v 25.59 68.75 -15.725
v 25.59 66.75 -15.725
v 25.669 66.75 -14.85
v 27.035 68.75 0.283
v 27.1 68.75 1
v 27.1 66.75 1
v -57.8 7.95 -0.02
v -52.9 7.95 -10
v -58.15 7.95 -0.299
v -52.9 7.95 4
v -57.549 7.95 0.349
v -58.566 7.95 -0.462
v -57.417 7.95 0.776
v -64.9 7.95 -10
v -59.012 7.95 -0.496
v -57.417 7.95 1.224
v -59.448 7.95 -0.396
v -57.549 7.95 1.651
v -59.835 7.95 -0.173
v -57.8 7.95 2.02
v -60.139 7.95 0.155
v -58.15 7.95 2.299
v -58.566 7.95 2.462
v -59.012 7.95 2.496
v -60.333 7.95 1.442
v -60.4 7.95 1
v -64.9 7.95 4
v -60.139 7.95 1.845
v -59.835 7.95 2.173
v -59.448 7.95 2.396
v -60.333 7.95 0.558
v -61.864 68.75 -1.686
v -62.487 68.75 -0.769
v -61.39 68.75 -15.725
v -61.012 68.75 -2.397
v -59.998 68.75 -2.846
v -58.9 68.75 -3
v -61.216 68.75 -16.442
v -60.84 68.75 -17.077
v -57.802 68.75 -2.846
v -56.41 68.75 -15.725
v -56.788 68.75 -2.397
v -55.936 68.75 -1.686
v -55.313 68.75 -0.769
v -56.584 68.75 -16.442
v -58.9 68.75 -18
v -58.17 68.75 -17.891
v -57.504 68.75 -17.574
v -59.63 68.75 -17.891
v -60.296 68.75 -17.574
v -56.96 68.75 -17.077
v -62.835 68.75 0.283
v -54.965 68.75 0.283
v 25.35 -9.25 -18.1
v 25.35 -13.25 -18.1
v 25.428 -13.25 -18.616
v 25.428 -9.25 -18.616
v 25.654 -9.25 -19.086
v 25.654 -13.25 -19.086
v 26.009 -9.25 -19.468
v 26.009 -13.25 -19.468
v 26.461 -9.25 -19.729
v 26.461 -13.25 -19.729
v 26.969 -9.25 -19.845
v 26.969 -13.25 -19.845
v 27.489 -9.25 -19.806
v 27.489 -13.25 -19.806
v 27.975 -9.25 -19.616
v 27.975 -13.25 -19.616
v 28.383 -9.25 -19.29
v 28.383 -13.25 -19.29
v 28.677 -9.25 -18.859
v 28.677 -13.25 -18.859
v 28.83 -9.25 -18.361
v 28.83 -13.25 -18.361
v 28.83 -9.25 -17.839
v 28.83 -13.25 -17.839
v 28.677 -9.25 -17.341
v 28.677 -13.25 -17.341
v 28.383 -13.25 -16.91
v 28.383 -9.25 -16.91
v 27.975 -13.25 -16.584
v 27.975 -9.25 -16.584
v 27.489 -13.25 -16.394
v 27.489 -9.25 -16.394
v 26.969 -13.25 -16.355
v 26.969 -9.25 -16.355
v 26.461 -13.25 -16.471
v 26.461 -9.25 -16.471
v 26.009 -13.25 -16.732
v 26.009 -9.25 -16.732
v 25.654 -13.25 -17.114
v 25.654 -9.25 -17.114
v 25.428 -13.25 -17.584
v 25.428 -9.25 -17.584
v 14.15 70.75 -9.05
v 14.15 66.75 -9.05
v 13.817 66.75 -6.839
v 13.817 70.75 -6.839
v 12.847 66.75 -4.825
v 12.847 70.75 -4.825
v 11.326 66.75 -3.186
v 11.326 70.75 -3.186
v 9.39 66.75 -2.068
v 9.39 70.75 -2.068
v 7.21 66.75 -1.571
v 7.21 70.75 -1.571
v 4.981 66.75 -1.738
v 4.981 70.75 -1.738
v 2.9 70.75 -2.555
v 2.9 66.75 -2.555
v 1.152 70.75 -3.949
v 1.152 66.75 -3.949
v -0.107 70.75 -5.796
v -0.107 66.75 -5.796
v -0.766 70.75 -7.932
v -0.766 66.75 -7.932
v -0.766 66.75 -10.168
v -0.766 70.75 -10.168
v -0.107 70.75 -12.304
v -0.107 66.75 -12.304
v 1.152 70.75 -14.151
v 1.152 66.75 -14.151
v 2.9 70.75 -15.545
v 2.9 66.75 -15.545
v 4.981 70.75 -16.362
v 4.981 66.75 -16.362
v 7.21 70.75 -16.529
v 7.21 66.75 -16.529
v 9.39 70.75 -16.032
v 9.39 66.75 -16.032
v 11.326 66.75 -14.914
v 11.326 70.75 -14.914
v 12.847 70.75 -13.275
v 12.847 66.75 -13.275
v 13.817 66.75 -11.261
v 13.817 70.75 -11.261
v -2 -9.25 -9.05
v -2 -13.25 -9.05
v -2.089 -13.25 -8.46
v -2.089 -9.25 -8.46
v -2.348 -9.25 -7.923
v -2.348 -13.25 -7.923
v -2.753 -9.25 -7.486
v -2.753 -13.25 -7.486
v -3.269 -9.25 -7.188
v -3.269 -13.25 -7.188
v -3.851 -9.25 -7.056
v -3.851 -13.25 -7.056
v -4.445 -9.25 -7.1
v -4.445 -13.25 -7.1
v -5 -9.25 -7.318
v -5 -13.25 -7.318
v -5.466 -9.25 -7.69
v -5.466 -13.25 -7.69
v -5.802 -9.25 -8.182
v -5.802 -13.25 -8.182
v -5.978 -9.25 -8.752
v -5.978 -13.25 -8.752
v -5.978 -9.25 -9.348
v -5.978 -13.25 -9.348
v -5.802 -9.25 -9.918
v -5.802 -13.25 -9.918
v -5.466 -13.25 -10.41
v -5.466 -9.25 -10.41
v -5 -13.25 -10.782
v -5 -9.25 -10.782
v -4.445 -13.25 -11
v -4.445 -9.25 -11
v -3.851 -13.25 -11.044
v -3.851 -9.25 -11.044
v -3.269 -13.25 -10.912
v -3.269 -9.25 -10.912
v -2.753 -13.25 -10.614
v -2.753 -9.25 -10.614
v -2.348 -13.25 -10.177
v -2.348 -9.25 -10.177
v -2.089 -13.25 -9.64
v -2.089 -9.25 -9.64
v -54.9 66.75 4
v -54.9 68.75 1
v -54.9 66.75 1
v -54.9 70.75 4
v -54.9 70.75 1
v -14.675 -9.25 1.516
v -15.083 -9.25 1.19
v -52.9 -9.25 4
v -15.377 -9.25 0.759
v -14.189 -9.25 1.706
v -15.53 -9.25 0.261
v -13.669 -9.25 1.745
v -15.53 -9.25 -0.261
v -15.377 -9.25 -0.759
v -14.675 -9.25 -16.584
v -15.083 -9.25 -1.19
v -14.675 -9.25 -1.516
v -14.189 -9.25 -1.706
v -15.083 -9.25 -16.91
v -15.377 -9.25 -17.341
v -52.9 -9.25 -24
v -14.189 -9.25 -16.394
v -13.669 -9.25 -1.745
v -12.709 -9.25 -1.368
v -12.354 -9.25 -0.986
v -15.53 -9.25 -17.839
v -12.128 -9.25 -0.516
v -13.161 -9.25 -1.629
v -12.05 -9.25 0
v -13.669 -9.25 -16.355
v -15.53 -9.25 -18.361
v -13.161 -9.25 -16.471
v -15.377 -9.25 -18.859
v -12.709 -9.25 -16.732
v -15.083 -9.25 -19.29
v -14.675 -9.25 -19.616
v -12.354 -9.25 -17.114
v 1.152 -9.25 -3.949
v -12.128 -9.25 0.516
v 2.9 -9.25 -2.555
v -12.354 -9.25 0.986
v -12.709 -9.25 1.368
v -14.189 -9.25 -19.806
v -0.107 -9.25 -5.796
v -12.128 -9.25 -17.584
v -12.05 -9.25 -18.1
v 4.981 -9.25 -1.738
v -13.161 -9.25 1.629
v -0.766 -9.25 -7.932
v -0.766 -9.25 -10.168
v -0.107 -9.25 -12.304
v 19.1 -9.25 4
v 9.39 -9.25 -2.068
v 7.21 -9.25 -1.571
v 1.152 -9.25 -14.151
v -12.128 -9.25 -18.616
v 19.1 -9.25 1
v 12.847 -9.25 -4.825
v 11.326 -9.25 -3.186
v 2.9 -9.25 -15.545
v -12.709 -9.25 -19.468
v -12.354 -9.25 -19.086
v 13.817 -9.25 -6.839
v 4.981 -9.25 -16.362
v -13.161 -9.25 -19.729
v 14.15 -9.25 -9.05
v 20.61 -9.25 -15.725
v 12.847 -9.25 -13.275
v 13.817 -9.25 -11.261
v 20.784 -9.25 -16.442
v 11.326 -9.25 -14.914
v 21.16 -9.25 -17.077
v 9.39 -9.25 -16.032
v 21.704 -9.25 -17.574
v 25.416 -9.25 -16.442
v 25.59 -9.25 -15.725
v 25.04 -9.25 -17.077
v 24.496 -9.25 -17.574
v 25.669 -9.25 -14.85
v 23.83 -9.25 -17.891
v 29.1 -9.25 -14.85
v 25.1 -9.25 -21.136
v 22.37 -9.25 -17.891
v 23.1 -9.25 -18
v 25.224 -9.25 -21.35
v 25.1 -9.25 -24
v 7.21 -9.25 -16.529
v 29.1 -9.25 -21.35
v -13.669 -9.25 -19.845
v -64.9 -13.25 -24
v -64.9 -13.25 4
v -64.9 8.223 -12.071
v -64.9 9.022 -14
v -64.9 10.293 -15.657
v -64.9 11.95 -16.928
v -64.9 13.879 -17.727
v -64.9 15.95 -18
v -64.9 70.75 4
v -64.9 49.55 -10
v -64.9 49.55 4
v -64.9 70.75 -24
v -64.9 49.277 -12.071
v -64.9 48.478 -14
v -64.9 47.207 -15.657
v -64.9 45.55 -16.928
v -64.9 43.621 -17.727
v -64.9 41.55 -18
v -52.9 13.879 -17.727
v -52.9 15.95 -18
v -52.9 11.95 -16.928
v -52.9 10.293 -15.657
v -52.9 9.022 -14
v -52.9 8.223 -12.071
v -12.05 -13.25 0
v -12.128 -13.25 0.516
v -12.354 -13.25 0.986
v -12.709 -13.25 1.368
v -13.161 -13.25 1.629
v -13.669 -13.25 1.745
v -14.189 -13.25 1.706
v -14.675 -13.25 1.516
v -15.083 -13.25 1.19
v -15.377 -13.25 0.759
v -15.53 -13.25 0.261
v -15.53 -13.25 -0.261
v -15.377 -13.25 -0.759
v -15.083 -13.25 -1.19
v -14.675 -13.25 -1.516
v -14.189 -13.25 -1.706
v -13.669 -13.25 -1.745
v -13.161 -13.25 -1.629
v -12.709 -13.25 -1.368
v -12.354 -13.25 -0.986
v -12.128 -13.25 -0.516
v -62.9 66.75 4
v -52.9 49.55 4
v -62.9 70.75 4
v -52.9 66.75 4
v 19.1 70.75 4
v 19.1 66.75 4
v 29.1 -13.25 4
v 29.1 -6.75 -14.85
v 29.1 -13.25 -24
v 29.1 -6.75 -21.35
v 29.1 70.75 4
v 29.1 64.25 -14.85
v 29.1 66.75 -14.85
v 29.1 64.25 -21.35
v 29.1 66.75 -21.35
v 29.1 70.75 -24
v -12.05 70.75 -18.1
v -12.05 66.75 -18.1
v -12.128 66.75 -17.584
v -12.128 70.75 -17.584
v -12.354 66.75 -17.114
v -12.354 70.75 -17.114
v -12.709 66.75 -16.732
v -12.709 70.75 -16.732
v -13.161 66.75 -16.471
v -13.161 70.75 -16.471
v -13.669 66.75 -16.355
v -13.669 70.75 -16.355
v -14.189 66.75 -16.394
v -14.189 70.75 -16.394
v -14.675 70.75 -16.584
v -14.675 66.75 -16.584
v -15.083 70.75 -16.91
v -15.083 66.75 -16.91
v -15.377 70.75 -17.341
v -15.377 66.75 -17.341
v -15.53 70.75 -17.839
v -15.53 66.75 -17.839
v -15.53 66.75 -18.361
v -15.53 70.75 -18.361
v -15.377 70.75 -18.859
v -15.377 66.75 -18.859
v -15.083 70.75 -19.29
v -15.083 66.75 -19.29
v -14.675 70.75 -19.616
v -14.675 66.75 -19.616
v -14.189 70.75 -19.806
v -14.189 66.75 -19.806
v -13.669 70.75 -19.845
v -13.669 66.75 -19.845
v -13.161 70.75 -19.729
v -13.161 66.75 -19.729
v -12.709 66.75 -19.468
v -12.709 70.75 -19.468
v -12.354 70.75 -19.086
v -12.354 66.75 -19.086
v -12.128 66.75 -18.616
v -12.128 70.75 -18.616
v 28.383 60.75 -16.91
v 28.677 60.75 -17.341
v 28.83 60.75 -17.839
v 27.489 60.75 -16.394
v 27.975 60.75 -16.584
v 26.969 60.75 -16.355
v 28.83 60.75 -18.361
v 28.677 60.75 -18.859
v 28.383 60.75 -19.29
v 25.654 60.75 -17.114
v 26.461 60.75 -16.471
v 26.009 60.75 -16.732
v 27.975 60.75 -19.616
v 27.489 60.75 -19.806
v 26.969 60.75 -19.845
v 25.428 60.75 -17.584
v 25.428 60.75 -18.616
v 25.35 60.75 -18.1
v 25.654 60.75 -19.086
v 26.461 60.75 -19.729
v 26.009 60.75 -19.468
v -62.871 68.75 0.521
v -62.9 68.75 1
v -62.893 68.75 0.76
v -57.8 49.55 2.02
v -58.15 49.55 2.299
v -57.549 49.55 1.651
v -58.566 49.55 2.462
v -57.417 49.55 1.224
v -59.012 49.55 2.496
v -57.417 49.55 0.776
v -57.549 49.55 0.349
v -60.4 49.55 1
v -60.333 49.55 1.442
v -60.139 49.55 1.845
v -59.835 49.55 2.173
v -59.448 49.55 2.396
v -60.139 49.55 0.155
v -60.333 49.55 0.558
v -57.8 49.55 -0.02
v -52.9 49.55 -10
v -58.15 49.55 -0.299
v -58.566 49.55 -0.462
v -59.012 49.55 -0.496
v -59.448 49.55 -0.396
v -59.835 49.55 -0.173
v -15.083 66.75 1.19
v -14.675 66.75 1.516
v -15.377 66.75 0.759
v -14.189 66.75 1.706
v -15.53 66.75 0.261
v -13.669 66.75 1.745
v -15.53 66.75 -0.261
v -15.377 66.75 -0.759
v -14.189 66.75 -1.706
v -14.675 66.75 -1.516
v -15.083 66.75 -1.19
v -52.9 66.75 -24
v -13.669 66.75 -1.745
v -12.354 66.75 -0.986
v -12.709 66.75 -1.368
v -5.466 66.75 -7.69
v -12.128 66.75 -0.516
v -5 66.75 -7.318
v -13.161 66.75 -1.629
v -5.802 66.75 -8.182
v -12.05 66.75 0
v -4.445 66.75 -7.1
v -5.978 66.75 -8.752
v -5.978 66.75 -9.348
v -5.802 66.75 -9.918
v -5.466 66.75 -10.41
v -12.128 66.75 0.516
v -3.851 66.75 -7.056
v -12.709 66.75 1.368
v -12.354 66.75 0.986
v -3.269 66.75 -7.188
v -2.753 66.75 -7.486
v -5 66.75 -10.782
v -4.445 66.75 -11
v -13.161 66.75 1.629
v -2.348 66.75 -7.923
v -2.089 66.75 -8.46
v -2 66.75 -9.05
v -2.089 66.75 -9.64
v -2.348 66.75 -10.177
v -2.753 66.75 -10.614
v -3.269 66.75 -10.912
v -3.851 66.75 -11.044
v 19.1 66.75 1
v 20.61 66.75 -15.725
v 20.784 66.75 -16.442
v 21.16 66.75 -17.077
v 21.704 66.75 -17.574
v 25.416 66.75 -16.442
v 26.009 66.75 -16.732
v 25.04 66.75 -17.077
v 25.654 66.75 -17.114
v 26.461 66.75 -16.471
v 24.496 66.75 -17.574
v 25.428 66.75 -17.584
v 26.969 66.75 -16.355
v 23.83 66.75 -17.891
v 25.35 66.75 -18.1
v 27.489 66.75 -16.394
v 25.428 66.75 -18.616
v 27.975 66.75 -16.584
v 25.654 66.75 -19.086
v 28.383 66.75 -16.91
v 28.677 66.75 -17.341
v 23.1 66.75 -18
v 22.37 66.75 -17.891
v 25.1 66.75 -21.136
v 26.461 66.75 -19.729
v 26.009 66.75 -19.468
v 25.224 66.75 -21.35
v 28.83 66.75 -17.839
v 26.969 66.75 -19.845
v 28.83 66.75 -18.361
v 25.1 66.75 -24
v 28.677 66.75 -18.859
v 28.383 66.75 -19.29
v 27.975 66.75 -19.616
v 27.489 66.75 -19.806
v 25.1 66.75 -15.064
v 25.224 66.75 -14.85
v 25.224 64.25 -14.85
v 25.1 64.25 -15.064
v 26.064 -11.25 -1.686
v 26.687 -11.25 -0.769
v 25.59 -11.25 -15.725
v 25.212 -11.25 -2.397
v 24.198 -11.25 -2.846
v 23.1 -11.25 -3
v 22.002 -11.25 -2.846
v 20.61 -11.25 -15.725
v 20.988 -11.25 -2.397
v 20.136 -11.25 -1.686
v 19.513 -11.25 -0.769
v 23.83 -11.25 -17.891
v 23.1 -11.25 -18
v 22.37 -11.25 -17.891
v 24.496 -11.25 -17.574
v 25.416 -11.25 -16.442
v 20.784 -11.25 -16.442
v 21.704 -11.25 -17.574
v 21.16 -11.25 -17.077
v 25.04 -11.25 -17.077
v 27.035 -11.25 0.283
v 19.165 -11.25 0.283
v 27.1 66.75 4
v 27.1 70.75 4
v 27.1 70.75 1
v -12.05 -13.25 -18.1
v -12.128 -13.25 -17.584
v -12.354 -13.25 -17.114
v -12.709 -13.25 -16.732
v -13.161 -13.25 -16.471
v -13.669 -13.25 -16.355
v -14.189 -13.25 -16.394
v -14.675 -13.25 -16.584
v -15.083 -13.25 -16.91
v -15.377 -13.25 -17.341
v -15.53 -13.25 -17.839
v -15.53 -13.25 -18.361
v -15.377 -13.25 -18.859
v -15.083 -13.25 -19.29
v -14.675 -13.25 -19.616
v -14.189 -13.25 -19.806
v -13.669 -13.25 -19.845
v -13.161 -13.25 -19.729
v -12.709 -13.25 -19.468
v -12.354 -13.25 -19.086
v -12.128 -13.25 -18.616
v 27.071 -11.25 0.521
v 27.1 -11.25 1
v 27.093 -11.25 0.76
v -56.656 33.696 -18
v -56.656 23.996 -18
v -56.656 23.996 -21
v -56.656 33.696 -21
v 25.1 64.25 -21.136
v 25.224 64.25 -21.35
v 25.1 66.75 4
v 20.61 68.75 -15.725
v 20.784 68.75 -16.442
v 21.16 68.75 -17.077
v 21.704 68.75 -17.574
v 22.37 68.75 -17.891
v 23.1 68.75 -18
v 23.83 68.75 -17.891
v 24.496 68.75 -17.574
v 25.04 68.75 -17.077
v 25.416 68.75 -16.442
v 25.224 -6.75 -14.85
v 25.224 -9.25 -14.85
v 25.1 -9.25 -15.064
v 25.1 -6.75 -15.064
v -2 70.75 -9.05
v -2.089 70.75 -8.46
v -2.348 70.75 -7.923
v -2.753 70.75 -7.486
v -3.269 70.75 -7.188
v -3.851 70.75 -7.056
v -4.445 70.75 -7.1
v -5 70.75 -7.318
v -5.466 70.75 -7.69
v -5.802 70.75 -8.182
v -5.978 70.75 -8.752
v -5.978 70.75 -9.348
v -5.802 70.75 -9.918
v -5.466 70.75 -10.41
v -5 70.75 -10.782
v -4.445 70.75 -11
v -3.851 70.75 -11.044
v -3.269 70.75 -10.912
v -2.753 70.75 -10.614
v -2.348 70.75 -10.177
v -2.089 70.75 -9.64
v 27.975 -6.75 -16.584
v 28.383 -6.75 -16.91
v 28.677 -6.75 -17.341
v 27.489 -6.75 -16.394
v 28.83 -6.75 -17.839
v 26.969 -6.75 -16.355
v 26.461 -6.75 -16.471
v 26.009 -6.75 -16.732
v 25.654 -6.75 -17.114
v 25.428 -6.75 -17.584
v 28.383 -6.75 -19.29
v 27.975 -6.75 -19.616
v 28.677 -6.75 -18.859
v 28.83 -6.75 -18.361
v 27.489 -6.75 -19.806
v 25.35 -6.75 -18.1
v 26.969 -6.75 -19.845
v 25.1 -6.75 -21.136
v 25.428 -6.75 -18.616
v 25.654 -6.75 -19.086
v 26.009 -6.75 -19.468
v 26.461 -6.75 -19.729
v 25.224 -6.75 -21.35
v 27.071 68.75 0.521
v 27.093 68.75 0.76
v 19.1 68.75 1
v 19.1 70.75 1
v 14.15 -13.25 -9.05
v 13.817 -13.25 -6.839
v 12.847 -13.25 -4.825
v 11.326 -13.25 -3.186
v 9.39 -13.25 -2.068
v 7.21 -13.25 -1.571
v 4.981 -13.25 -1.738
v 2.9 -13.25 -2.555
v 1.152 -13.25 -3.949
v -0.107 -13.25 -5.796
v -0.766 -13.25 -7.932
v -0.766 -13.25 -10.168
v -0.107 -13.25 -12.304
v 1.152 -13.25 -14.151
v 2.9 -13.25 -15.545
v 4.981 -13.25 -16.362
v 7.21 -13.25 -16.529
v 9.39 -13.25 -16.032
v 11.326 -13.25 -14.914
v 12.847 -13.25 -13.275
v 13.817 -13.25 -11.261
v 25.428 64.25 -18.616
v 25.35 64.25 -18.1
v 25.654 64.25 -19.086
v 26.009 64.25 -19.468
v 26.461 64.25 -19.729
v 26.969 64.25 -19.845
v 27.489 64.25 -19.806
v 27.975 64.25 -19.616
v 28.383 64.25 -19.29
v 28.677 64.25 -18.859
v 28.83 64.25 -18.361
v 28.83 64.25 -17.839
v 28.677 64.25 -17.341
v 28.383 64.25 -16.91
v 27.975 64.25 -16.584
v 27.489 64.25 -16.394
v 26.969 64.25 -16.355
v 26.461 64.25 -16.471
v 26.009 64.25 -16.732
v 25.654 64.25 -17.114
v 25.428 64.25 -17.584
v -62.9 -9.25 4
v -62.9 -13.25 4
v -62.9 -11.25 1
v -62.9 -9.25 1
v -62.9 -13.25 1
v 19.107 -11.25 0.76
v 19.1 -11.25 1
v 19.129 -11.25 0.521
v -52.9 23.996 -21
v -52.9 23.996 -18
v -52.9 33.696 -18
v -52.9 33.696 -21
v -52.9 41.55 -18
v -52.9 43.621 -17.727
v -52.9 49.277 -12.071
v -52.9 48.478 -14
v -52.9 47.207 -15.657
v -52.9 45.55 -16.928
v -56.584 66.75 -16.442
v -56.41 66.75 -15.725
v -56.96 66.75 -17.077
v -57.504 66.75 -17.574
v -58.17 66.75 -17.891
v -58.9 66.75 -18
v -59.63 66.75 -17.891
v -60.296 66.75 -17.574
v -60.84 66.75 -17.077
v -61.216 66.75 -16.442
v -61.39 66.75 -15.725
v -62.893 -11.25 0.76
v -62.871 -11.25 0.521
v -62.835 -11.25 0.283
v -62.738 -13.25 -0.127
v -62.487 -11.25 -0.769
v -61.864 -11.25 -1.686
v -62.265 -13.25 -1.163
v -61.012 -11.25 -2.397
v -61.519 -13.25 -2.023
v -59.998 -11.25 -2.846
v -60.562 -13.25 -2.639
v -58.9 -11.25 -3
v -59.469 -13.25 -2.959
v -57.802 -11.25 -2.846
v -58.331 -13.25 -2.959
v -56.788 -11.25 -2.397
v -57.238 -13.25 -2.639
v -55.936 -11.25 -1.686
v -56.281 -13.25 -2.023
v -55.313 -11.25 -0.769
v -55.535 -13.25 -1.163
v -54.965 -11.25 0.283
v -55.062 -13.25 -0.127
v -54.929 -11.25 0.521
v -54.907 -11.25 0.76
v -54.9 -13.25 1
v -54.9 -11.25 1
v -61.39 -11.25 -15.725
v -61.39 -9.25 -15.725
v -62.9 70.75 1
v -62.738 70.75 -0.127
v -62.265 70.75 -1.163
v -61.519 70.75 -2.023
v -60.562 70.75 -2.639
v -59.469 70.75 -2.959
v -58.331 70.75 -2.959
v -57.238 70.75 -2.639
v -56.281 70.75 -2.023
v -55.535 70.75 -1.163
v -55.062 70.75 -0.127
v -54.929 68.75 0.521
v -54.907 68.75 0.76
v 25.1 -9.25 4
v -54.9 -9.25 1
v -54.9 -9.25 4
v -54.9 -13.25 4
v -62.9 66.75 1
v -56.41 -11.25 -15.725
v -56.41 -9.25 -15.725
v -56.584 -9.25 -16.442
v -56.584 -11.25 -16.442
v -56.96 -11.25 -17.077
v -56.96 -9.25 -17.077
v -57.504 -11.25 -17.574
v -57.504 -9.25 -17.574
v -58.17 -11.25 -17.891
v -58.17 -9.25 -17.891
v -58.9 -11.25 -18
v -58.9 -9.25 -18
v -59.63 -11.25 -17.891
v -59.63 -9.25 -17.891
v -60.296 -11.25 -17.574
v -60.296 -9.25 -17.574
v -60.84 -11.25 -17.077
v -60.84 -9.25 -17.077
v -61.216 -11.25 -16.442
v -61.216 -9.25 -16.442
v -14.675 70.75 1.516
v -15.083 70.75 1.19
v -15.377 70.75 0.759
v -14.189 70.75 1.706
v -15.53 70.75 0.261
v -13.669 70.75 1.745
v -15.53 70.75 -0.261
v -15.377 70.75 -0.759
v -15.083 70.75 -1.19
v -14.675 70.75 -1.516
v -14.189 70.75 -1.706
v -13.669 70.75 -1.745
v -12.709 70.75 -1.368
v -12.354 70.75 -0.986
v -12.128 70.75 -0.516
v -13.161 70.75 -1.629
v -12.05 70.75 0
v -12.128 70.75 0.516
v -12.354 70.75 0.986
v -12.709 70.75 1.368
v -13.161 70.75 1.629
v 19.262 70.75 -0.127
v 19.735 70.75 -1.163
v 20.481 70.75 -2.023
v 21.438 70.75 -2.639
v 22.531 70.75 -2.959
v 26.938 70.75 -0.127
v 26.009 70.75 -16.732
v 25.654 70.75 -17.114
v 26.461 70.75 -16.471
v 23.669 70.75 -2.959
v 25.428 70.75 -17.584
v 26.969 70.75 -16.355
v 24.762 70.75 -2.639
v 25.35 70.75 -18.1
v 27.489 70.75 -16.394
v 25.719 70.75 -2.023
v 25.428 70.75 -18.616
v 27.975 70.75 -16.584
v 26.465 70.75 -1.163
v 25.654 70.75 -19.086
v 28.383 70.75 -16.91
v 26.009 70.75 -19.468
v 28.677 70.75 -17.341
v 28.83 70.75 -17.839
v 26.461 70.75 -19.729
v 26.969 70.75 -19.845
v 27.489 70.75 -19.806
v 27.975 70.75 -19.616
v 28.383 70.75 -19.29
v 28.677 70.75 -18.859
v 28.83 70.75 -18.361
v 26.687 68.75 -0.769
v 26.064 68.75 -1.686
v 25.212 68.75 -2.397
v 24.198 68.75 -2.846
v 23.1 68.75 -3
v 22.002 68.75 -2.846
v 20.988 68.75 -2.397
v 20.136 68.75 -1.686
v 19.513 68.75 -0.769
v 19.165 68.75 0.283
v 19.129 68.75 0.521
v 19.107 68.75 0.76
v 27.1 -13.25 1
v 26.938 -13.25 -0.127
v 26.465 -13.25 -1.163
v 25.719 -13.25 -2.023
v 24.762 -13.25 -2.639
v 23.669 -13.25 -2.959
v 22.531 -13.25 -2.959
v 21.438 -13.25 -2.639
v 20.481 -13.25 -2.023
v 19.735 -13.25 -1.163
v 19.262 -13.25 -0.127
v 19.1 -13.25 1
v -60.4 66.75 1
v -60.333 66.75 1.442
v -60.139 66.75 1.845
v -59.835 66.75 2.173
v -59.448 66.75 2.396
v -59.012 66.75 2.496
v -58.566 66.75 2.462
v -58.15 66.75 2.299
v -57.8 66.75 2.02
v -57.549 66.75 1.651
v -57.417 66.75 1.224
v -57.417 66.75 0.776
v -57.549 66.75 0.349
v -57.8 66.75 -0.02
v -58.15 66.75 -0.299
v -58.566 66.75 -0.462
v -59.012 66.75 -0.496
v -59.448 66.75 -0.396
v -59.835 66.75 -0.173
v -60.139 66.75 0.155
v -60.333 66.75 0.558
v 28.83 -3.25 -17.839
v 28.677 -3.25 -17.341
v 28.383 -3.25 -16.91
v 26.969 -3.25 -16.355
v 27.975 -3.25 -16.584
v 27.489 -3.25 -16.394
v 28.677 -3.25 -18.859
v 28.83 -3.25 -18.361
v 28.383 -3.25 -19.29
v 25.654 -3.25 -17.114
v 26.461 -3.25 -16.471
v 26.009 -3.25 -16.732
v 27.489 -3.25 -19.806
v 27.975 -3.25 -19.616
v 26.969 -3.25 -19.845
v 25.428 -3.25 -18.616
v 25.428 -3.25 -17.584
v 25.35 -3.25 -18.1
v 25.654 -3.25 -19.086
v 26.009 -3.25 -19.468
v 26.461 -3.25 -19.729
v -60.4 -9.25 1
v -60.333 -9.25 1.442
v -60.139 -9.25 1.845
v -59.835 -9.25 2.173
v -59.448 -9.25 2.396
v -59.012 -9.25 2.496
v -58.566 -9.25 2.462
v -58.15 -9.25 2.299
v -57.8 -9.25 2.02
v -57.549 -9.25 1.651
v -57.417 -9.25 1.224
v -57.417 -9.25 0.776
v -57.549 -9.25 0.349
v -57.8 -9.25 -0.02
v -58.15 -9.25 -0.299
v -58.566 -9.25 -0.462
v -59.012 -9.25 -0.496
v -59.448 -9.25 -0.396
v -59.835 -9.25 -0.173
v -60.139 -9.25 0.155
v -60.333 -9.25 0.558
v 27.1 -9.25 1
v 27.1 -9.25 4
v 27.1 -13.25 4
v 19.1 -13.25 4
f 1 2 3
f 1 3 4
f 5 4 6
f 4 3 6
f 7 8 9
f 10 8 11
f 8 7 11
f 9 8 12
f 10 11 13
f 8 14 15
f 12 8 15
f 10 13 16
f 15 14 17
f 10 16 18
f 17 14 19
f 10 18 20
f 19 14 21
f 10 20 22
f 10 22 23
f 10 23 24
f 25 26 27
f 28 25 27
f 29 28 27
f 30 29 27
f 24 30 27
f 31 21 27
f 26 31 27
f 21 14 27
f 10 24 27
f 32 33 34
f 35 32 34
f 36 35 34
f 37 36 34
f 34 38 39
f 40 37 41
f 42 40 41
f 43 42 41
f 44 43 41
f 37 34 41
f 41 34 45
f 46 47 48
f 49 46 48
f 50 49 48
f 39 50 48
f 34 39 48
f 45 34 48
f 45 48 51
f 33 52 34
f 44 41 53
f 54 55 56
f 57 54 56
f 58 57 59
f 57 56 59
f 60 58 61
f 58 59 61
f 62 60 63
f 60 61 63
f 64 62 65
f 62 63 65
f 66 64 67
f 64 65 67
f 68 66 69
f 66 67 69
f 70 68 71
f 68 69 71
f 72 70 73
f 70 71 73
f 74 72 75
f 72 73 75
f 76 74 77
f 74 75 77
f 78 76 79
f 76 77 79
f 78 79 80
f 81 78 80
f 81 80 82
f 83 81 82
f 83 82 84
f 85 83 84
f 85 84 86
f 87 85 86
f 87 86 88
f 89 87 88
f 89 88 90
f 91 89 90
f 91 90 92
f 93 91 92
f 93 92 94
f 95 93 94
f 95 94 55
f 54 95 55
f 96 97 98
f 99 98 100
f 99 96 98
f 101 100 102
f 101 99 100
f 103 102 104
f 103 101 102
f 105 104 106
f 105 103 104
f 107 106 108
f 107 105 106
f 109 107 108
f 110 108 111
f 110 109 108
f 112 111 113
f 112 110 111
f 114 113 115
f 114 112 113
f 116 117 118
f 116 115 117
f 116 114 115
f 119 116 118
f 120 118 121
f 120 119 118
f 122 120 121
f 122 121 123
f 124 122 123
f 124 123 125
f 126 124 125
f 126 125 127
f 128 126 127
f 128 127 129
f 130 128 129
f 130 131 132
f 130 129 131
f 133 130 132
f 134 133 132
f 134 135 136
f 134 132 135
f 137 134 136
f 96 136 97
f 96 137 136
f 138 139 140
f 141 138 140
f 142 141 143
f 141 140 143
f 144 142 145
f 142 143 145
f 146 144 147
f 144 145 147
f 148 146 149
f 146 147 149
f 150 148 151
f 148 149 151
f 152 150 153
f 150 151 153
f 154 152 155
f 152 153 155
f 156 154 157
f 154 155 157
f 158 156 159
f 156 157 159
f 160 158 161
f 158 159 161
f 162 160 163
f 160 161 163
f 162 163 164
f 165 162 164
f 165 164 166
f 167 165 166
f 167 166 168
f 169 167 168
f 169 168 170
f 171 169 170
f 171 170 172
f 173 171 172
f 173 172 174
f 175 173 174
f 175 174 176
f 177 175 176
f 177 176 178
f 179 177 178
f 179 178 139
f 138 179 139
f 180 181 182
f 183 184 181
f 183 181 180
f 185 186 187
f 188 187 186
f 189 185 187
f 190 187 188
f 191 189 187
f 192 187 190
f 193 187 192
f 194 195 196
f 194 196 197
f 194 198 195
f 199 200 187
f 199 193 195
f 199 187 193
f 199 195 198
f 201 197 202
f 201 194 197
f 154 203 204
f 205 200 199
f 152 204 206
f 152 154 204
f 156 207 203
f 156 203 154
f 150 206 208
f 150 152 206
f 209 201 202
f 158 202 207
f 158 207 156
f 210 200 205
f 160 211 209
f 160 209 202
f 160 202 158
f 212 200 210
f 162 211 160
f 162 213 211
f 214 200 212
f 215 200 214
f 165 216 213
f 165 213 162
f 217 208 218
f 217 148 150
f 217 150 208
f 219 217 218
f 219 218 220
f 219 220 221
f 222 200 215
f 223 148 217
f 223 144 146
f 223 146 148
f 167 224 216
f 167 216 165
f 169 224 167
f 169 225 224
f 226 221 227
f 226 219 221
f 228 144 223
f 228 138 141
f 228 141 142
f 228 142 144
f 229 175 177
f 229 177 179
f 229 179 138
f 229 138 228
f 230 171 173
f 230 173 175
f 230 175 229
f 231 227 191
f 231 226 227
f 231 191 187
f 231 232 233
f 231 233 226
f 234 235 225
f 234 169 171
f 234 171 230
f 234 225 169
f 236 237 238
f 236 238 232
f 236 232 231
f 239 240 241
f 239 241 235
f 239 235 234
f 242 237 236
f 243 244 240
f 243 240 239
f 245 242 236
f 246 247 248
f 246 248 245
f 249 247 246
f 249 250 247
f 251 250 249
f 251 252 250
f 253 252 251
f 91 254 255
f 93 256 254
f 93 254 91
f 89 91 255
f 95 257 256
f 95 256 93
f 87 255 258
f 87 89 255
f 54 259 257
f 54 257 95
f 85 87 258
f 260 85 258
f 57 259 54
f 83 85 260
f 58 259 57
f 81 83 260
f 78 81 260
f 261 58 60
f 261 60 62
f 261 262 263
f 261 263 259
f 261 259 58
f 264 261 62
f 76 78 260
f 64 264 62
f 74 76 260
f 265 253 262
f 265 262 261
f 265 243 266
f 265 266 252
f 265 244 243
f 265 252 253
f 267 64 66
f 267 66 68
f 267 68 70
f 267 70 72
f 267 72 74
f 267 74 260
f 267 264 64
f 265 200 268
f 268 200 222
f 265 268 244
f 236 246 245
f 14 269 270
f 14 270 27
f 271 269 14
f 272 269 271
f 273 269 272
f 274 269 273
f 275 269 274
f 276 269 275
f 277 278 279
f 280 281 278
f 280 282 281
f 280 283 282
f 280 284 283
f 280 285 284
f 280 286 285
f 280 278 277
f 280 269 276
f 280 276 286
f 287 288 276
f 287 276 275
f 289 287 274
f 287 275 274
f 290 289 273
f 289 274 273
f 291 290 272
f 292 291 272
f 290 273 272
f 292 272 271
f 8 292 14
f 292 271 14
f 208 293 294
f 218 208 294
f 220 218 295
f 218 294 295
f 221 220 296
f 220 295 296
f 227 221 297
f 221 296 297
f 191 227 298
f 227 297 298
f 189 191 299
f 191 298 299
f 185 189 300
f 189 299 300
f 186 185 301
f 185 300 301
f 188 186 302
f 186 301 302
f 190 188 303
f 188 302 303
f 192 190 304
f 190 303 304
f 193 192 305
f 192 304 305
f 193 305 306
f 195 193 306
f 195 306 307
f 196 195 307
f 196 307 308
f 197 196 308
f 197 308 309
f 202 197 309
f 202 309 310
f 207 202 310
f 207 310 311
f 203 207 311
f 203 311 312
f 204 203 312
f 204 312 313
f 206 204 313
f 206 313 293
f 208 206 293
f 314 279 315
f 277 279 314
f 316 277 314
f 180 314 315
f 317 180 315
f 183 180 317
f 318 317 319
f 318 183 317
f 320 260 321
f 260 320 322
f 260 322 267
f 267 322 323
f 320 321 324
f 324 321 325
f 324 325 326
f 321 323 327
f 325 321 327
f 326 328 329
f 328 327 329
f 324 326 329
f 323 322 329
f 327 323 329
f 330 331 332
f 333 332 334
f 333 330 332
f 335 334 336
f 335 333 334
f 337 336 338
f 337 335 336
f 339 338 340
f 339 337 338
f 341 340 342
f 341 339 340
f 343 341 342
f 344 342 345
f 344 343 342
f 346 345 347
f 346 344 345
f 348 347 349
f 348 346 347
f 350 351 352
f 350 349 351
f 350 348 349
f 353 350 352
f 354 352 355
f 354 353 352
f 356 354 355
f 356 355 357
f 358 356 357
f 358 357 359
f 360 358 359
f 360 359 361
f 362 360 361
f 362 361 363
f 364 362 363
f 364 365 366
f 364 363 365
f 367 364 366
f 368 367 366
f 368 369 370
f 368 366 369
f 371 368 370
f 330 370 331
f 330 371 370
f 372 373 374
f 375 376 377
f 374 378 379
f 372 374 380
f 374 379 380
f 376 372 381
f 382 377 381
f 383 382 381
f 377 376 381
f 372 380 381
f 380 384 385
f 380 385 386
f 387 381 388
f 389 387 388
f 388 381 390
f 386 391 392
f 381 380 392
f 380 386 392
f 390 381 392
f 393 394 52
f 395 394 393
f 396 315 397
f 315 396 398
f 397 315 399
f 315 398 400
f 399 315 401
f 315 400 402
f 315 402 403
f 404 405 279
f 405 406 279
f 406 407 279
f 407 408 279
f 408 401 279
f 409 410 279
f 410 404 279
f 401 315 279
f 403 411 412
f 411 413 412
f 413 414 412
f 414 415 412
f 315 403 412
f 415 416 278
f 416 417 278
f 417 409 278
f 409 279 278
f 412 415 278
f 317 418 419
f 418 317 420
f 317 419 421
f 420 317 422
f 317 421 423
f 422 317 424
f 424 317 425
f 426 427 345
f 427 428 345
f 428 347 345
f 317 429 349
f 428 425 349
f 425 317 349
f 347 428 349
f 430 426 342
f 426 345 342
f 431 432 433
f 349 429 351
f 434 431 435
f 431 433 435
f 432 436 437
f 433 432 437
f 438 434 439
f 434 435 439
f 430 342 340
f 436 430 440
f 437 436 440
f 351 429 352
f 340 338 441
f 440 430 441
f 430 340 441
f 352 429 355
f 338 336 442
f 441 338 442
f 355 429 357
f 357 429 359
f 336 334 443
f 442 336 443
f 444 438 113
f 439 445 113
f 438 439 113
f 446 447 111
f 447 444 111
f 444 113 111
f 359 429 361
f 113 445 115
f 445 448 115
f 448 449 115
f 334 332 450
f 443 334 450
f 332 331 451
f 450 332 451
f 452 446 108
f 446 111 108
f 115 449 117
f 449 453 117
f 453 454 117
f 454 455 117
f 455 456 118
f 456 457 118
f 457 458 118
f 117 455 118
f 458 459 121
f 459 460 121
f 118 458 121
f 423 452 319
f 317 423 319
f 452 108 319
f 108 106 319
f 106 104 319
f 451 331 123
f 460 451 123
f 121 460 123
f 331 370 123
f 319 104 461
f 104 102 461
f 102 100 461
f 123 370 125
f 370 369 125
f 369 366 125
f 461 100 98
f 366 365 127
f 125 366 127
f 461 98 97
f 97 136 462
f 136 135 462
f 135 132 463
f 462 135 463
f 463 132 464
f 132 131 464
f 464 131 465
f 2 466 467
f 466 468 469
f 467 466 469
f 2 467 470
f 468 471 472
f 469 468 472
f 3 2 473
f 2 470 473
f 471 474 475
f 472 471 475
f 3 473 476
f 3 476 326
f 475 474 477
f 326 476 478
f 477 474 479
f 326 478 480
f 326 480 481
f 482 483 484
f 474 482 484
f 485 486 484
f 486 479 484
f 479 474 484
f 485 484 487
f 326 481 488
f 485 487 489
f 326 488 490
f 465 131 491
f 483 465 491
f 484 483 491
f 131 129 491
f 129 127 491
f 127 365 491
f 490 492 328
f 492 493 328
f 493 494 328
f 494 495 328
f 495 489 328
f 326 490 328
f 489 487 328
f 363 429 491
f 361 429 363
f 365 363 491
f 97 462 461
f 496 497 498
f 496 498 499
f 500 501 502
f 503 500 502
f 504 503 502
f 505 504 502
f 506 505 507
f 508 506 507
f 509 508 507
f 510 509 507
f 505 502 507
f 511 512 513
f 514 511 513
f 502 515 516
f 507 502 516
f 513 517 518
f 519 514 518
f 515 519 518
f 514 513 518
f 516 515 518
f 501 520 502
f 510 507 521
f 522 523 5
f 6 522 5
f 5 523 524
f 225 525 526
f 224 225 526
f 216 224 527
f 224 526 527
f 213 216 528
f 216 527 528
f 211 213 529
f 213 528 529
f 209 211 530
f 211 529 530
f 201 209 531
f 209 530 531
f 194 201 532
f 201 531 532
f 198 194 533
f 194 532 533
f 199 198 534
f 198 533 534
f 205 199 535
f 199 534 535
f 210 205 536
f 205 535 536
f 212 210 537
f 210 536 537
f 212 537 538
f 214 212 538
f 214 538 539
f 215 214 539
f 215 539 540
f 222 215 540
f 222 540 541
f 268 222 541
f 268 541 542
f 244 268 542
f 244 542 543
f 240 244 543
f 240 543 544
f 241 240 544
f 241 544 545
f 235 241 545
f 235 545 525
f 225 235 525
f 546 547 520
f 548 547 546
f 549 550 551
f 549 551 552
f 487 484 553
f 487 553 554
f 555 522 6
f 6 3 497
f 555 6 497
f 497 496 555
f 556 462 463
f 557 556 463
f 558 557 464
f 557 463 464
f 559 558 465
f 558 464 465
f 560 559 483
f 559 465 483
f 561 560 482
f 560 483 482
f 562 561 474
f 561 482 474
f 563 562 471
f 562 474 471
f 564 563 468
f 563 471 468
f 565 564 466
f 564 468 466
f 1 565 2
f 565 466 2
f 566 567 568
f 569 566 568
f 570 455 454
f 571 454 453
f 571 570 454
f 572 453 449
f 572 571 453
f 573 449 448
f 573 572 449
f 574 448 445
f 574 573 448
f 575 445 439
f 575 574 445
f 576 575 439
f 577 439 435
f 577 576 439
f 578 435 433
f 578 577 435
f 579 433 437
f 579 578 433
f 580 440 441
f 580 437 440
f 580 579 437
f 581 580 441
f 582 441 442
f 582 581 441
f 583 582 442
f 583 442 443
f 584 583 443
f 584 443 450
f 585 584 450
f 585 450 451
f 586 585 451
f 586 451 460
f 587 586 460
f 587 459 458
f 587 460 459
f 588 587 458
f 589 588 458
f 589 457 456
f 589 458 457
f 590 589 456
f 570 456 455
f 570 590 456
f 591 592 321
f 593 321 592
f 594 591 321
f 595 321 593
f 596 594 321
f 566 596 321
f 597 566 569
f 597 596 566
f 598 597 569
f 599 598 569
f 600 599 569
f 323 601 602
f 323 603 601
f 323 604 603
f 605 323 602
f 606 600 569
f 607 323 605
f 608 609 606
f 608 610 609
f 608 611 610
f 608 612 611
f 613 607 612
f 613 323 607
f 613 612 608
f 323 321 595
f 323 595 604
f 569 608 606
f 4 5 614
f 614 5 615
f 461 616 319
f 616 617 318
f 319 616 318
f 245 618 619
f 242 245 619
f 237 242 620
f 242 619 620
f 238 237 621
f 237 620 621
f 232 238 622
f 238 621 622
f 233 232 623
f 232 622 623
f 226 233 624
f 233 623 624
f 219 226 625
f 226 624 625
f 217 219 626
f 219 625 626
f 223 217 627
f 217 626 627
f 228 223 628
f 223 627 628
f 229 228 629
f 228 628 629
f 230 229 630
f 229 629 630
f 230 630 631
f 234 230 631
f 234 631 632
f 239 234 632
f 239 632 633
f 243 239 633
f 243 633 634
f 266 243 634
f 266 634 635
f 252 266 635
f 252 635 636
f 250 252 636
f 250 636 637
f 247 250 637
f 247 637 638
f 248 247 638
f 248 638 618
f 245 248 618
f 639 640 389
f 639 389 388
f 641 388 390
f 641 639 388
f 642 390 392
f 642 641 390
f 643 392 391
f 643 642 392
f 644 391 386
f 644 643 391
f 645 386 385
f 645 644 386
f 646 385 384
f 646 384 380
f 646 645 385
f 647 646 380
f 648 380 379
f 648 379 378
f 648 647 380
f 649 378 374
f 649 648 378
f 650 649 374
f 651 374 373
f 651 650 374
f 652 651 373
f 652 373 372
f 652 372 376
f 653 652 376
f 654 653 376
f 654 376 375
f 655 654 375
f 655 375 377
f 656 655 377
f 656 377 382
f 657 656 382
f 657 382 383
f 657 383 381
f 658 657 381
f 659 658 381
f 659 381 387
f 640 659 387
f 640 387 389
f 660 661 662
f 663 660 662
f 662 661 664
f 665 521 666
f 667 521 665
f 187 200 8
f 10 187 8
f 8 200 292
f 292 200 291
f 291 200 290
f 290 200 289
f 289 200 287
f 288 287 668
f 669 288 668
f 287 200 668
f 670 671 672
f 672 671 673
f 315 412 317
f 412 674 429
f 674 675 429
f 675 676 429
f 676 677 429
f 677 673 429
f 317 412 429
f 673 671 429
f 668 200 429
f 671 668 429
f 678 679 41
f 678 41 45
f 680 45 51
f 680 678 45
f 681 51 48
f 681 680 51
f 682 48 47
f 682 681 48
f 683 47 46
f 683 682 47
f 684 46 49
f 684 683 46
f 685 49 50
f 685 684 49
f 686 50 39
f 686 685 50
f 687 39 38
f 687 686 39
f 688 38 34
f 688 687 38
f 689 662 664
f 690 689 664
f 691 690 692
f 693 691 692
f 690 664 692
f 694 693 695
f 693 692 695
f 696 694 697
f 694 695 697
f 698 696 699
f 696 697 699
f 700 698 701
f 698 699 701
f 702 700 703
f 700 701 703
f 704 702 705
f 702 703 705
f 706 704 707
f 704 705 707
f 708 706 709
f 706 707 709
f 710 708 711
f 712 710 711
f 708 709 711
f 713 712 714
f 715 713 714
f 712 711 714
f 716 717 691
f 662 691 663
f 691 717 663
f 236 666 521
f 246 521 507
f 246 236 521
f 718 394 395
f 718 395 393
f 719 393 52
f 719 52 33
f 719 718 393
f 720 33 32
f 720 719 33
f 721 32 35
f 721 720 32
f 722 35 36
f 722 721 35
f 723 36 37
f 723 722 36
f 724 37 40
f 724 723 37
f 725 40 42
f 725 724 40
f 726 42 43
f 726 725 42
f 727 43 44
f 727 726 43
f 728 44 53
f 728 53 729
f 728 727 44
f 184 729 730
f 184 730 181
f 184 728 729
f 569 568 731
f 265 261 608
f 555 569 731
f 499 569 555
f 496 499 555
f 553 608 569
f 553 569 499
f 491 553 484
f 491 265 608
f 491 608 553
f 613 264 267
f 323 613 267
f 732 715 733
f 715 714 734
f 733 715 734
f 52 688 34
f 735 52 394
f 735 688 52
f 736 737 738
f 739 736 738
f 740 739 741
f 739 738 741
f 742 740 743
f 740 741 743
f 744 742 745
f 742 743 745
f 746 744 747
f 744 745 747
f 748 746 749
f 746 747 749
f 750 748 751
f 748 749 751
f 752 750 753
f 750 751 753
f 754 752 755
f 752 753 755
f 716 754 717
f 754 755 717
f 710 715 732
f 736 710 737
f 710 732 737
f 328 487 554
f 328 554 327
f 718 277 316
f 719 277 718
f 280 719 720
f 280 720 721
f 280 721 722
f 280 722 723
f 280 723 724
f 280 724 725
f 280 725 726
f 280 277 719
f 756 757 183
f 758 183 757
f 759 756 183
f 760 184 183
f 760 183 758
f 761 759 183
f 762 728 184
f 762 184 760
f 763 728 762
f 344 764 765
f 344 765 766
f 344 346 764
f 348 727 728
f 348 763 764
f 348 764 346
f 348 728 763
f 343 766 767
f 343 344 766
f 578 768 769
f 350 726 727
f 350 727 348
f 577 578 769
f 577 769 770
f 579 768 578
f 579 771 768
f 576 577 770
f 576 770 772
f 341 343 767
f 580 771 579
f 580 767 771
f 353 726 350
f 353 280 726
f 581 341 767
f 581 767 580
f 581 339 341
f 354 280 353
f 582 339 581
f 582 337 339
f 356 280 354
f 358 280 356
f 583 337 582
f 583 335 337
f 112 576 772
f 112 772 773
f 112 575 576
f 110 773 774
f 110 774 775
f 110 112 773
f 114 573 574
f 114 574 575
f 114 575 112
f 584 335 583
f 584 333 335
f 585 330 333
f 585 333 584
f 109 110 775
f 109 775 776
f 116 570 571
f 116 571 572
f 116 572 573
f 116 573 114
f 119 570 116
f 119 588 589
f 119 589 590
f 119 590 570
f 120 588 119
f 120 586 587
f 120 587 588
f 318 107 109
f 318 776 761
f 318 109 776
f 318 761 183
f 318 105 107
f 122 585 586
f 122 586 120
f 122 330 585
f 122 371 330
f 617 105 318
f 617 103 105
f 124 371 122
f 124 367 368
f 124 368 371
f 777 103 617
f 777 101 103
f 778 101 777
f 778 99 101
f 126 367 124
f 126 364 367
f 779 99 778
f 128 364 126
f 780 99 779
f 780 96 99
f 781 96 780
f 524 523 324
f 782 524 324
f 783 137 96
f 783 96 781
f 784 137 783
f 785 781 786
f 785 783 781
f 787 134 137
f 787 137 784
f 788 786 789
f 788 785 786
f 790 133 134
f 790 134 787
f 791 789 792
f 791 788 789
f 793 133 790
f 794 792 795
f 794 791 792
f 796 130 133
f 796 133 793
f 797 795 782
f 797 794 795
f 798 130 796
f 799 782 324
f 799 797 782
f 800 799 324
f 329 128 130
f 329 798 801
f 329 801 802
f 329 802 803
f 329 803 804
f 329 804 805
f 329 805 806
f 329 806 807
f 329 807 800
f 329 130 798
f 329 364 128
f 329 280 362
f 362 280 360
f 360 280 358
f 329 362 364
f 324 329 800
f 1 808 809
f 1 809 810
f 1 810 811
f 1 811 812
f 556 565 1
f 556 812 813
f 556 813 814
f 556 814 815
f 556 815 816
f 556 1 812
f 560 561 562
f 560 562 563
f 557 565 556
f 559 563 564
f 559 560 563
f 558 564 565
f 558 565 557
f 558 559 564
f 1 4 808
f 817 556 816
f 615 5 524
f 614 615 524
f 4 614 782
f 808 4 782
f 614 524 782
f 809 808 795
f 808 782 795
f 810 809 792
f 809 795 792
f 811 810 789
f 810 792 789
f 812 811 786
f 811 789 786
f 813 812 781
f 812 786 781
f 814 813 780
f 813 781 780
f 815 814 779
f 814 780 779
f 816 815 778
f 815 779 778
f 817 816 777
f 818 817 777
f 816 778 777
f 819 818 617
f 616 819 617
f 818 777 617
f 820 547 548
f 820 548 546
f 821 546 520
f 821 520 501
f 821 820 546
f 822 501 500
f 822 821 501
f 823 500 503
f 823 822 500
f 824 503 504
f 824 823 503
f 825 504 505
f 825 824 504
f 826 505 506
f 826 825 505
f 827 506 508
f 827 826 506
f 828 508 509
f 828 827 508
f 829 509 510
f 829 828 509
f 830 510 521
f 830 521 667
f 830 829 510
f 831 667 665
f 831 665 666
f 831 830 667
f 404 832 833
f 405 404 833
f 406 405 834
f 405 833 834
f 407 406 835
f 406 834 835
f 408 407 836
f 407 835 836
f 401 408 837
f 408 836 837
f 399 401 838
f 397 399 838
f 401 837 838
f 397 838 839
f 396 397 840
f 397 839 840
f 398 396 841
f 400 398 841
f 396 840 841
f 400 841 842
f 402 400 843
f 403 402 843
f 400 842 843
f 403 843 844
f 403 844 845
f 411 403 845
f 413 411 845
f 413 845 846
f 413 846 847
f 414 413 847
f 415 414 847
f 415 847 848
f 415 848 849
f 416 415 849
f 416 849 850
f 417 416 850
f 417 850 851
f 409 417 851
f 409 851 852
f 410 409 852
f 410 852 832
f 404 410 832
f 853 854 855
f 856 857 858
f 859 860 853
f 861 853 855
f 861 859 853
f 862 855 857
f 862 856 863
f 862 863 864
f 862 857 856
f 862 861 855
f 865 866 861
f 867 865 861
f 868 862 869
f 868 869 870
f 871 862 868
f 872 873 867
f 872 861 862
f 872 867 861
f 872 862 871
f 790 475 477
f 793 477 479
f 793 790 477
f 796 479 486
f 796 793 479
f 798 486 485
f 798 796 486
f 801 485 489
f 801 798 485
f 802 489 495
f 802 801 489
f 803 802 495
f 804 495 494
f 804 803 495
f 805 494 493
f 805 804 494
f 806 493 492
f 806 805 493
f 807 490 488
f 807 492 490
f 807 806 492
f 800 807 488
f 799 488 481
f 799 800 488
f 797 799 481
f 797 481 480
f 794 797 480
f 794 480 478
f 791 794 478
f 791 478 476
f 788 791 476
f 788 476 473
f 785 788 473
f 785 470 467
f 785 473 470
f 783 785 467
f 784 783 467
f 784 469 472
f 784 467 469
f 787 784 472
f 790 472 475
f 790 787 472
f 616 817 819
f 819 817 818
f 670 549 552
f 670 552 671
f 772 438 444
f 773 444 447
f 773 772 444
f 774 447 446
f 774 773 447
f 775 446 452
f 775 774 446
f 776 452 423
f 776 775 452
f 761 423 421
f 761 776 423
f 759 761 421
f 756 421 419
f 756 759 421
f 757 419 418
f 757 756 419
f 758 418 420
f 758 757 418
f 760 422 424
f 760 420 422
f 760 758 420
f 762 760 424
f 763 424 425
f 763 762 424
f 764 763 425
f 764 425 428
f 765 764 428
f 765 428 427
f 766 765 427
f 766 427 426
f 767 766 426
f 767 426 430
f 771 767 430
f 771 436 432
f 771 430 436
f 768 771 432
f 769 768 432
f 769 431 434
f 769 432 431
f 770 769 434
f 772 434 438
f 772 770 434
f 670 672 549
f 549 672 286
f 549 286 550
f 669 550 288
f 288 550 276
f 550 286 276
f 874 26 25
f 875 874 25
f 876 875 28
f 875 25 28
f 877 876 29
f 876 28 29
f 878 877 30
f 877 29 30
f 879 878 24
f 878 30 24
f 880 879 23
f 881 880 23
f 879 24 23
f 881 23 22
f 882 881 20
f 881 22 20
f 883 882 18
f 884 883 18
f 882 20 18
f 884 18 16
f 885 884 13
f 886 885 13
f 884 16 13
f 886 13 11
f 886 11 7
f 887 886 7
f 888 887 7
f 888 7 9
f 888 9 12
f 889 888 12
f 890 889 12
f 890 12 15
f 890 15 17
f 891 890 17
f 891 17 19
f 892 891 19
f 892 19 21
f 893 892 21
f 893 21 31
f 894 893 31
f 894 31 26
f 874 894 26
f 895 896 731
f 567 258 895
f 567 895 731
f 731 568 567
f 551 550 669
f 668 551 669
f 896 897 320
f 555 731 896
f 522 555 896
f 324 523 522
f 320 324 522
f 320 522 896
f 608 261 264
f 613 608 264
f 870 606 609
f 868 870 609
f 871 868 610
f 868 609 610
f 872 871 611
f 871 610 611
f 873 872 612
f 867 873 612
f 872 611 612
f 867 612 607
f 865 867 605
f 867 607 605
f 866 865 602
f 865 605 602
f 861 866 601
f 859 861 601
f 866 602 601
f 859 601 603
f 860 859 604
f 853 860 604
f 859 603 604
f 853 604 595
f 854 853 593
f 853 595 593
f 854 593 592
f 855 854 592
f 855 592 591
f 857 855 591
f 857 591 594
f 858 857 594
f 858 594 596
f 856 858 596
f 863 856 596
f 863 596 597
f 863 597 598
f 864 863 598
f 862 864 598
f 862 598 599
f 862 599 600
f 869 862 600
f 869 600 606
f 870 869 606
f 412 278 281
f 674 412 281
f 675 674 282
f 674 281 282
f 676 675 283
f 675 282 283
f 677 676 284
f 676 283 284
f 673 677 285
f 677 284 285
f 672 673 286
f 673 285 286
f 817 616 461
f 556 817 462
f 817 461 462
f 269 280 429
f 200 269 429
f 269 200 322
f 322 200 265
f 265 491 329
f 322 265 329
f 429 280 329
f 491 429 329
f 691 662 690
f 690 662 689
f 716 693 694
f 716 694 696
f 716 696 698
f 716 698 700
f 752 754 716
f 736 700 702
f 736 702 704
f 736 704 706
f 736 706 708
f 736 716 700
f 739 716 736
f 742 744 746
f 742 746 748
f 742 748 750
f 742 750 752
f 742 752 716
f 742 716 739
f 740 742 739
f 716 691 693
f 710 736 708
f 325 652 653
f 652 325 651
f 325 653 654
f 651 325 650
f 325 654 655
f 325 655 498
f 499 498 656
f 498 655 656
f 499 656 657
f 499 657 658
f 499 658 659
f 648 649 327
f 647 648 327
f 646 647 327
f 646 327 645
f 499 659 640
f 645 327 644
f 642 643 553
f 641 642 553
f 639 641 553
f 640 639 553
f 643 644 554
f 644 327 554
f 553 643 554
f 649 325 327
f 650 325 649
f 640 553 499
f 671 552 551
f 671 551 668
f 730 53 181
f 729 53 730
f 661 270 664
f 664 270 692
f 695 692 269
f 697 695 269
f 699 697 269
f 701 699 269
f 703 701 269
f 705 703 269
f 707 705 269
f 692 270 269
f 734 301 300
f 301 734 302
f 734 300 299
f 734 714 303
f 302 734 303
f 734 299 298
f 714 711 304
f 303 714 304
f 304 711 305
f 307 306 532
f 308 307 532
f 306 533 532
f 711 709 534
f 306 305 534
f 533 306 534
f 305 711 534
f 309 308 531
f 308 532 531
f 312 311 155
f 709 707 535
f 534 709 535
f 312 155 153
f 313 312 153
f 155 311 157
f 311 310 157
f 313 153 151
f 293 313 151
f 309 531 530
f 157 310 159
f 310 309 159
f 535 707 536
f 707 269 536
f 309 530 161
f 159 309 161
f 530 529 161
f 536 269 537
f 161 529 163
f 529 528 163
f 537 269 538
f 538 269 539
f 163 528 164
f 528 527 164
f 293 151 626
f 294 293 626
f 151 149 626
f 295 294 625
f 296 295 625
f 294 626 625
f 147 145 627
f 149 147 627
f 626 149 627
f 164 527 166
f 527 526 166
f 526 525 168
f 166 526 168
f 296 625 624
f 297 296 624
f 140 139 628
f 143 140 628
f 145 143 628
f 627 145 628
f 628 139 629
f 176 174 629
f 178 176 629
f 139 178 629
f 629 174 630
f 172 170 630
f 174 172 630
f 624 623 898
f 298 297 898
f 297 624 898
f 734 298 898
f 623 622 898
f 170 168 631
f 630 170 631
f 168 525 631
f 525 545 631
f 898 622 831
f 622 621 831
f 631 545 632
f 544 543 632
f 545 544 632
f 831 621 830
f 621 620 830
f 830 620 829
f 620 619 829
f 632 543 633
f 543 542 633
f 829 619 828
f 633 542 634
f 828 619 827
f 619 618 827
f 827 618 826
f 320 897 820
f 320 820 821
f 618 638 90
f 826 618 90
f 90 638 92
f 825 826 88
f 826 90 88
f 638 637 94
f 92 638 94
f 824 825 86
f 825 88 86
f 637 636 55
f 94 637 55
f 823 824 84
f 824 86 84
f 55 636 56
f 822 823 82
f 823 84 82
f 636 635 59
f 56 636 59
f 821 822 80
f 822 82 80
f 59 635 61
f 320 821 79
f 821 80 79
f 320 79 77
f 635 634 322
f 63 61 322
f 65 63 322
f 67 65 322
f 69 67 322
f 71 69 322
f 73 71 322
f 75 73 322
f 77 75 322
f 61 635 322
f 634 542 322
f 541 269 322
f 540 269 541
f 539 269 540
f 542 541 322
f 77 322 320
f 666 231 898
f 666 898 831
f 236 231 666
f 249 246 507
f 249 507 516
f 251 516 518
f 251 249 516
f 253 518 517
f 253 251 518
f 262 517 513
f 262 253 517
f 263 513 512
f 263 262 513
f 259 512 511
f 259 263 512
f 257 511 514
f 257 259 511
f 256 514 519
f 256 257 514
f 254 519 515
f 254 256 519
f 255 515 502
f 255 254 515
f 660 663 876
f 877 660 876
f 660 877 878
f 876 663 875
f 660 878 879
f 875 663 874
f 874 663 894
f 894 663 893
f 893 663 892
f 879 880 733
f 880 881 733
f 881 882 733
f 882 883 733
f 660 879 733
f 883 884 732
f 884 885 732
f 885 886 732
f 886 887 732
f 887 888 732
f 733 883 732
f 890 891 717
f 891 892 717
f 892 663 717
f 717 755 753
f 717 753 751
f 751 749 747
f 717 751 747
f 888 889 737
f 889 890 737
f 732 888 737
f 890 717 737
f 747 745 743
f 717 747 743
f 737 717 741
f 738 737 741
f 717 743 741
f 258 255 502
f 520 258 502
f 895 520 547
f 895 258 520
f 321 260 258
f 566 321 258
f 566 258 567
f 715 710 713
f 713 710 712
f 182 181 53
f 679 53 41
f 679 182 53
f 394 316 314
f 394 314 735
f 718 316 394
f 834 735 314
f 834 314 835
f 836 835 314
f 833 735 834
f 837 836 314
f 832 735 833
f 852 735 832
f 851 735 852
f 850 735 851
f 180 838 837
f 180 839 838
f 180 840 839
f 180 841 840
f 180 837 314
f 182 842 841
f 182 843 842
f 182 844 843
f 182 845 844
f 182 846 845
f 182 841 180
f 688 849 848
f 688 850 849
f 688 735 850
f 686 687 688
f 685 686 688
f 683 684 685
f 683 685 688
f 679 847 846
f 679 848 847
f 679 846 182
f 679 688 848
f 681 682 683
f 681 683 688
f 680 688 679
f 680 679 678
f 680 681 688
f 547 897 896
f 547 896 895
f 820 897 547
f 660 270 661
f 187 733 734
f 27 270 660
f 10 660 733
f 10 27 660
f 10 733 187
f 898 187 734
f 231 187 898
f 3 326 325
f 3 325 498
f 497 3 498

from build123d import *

# Parameters (mm, degrees)
SALIENTE_EXTRUIR1_DEPTH      = 4
SALIENTE_EXTRUIR1_DEPTH_BACK = 24
CROQUIS1_W                   = 94
CROQUIS1_H                   = 84
CROQUIS1_W_2                 = 78
CROQUIS1_H_2                 = 76
CROQUIS10_R                  = 1.5
CORTAR_EXTRUIR6_DEPTH        = 109.830188826
CORTAR_EXTRUIR1_DEPTH        = 2
CORTAR_EXTRUIR5_DEPTH        = 2
CORTAR_EXTRUIR2_REACH        = 122.073
CROQUIS12_R                  = 7.5
CROQUIS12_R_2                = 1.75
CROQUIS12_R_3                = 2
CORTAR_EXTRUIR7_DEPTH        = 10
CROQUIS17_W                  = 4
CROQUIS17_H                  = 9.7
CORTAR_EXTRUIR10_DEPTH       = 3
CORTAR_EXTRUIR11_DEPTH       = 2.5
SIMETR_A2_COPY_1_DEPTH       = 2
SIMETR_A2_COPY_2_DEPTH       = 2


with BuildPart() as part:
    # Croquis1 → Saliente-Extruir1 (new, two sides: drawn at the far end of the back side and taken through both)
    with BuildSketch(Plane.XY.offset(-SALIENTE_EXTRUIR1_DEPTH_BACK)):
        with Locations((-17.9, 28.75)):
            Rectangle(CROQUIS1_W, CROQUIS1_H)
        with Locations((-13.9, 28.75)):
            Rectangle(CROQUIS1_W_2, CROQUIS1_H_2, mode=Mode.SUBTRACT)
    extrude(amount=SALIENTE_EXTRUIR1_DEPTH + SALIENTE_EXTRUIR1_DEPTH_BACK)

    # Croquis10 → Cortar-Extruir6 (cut, through all)
    with BuildSketch(Plane(origin=(0, 70.75, 0), x_dir=(1, 0, 0), z_dir=(0, 1, 0))):
        with Locations((-58.9, -1)):
            Circle(CROQUIS10_R)
    extrude(amount=-CORTAR_EXTRUIR6_DEPTH, mode=Mode.SUBTRACT)

    # Croquis2 → Cortar-Extruir1 (cut)
    with BuildSketch(Plane(origin=(0, -13.25, 0), x_dir=(-1, 0, 0), z_dir=(0, -1, 0))):
        with BuildLine():
            Line((54.9, -1), (54.9, -4))
            Line((54.9, -4), (62.9, -4))
            Line((62.9, -4), (62.9, -1))
            ThreePointArc((62.9, -1), (58.9, 3), (54.9, -1))
        make_face()
    cortar_extruir1 = extrude(amount=-CORTAR_EXTRUIR1_DEPTH, mode=Mode.SUBTRACT)

    # Croquis9 → Cortar-Extruir5 (cut)
    with BuildSketch(Plane(origin=(0, -9.25, 0), x_dir=(1, 0, 0), z_dir=(0, 1, 0))):
        with BuildLine():
            Line((-61.389870926, 15.724817194), (-62.9, -1))
            Line((-62.9, -1), (-62.9, -4))
            Line((-62.9, -4), (-54.9, -4))
            Line((-54.9, -4), (-54.9, -1))
            Line((-54.9, -1), (-56.410129074, 15.724817194))
            ThreePointArc((-56.410129074, 15.724817194), (-58.9, 18), (-61.389870926, 15.724817194))
        make_face()
    cortar_extruir5 = extrude(amount=-CORTAR_EXTRUIR5_DEPTH, mode=Mode.SUBTRACT)

    # Croquis5 → Cortar-Extruir2 (cut, up to next)
    with BuildSketch(Plane.ZY.offset(64.9), mode=Mode.PRIVATE) as cortar_extruir2_sk1:
        with BuildLine():
            Line((-18, 41.55), (-18, 15.95))
            ThreePointArc((-18, 15.95), (-15.656854249, 10.293145751), (-10, 7.95))
            Line((-10, 7.95), (4, 7.95))
            Line((4, 7.95), (4, 49.55))
            Line((4, 49.55), (-10, 49.55))
            ThreePointArc((-10, 49.55), (-15.656854249, 47.206854249), (-18, 41.55))
        make_face()
    cortar_extruir2_tool1 = extrude(cortar_extruir2_sk1.sketch, amount=-CORTAR_EXTRUIR2_REACH, mode=Mode.PRIVATE) & part.part
    add(cortar_extruir2_tool1.solids().sort_by_distance((-64.9, 28.75, -6.714921))[0], mode=Mode.SUBTRACT)

    # Croquis12 → Cortar-Extruir7 (cut)
    with BuildSketch(Plane.XZ.offset(13.25)):
        with Locations((6.65, -9.05)):
            Circle(CROQUIS12_R)
        with Locations((-13.8, 0)):
            Circle(CROQUIS12_R_2)
        with Locations((-13.8, -18.1)):
            Circle(CROQUIS12_R_2)
        with Locations((-4, -9.05)):
            Circle(CROQUIS12_R_3)
        with Locations((27.1, -18.1)):
            Circle(CROQUIS12_R_2)
    cortar_extruir7 = extrude(amount=-CORTAR_EXTRUIR7_DEPTH, mode=Mode.SUBTRACT)

    # Croquis17 → Cortar-Extruir10 (cut)
    with BuildSketch(Plane.XY.offset(-18)):
        with Locations((-54.655566502, 28.846197779)):
            Rectangle(CROQUIS17_W, CROQUIS17_H)
    extrude(amount=-CORTAR_EXTRUIR10_DEPTH, mode=Mode.SUBTRACT)

    # Croquis20 → Cortar-Extruir11 (cut)
    with BuildSketch(Plane(origin=(0, -9.25, 0), x_dir=(-1, 0, 0), z_dir=(0, -1, 0))):
        Polygon((-29.1, 14.85), (-27.1, 14.85), (-25.223611625, 14.85), (-24.285417438, 16.475), (-23.34722325, 18.1), (-24.285417438, 19.725), (-25.223611625, 21.35), (-27.1, 21.35), (-29.1, 21.35), align=None)
    cortar_extruir11 = extrude(amount=-CORTAR_EXTRUIR11_DEPTH, mode=Mode.SUBTRACT)

    # Simetría3: Cortar-Extruir1, Cortar-Extruir5 across plane
    add(cortar_extruir1.mirror(Plane.ZY.offset(17.9)), mode=Mode.SUBTRACT)
    add(cortar_extruir5.mirror(Plane.ZY.offset(17.9)), mode=Mode.SUBTRACT)

    # Simetría2: Cortar-Extruir1, Cortar-Extruir5, Cortar-Extruir7, Cortar-Extruir11 across plane
    add(cortar_extruir1.mirror(Plane(origin=(0, 28.75, 0), x_dir=(0, 0, 1), z_dir=(0, -1, 0))), mode=Mode.SUBTRACT)
    add(cortar_extruir5.mirror(Plane(origin=(0, 28.75, 0), x_dir=(0, 0, 1), z_dir=(0, -1, 0))), mode=Mode.SUBTRACT)
    add(cortar_extruir7.mirror(Plane(origin=(0, 28.75, 0), x_dir=(0, 0, 1), z_dir=(0, -1, 0))), mode=Mode.SUBTRACT)
    add(cortar_extruir11.mirror(Plane(origin=(0, 28.75, 0), x_dir=(0, 0, 1), z_dir=(0, -1, 0))), mode=Mode.SUBTRACT)

    # Simetría2 copy 1 sketch → Simetría2 copy 1 (cut)
    with BuildSketch(Plane(origin=(-35.8, 70.75, 0), x_dir=(1, 0, 0), z_dir=(0, 1, 0))):
        with BuildLine():
            Line((54.9, -1), (54.9, -4))
            Line((54.9, -4), (62.9, -4))
            Line((62.9, -4), (62.9, -1))
            ThreePointArc((62.9, -1), (58.9, 3), (54.9, -1))
        make_face()
    extrude(amount=-SIMETR_A2_COPY_1_DEPTH, mode=Mode.SUBTRACT)

    # Simetría2 copy 2 sketch → Simetría2 copy 2 (cut)
    with BuildSketch(Plane(origin=(-35.8, 66.75, 0), x_dir=(-1, 0, 0), z_dir=(0, -1, 0))):
        with BuildLine():
            Line((-61.389870926, 15.724817194), (-62.9, -1))
            Line((-62.9, -1), (-62.9, -4))
            Line((-62.9, -4), (-54.9, -4))
            Line((-54.9, -4), (-54.9, -1))
            Line((-54.9, -1), (-56.410129074, 15.724817194))
            ThreePointArc((-56.410129074, 15.724817194), (-58.9, 18), (-61.389870926, 15.724817194))
        make_face()
    extrude(amount=-SIMETR_A2_COPY_2_DEPTH, mode=Mode.SUBTRACT)


solid = part.part
